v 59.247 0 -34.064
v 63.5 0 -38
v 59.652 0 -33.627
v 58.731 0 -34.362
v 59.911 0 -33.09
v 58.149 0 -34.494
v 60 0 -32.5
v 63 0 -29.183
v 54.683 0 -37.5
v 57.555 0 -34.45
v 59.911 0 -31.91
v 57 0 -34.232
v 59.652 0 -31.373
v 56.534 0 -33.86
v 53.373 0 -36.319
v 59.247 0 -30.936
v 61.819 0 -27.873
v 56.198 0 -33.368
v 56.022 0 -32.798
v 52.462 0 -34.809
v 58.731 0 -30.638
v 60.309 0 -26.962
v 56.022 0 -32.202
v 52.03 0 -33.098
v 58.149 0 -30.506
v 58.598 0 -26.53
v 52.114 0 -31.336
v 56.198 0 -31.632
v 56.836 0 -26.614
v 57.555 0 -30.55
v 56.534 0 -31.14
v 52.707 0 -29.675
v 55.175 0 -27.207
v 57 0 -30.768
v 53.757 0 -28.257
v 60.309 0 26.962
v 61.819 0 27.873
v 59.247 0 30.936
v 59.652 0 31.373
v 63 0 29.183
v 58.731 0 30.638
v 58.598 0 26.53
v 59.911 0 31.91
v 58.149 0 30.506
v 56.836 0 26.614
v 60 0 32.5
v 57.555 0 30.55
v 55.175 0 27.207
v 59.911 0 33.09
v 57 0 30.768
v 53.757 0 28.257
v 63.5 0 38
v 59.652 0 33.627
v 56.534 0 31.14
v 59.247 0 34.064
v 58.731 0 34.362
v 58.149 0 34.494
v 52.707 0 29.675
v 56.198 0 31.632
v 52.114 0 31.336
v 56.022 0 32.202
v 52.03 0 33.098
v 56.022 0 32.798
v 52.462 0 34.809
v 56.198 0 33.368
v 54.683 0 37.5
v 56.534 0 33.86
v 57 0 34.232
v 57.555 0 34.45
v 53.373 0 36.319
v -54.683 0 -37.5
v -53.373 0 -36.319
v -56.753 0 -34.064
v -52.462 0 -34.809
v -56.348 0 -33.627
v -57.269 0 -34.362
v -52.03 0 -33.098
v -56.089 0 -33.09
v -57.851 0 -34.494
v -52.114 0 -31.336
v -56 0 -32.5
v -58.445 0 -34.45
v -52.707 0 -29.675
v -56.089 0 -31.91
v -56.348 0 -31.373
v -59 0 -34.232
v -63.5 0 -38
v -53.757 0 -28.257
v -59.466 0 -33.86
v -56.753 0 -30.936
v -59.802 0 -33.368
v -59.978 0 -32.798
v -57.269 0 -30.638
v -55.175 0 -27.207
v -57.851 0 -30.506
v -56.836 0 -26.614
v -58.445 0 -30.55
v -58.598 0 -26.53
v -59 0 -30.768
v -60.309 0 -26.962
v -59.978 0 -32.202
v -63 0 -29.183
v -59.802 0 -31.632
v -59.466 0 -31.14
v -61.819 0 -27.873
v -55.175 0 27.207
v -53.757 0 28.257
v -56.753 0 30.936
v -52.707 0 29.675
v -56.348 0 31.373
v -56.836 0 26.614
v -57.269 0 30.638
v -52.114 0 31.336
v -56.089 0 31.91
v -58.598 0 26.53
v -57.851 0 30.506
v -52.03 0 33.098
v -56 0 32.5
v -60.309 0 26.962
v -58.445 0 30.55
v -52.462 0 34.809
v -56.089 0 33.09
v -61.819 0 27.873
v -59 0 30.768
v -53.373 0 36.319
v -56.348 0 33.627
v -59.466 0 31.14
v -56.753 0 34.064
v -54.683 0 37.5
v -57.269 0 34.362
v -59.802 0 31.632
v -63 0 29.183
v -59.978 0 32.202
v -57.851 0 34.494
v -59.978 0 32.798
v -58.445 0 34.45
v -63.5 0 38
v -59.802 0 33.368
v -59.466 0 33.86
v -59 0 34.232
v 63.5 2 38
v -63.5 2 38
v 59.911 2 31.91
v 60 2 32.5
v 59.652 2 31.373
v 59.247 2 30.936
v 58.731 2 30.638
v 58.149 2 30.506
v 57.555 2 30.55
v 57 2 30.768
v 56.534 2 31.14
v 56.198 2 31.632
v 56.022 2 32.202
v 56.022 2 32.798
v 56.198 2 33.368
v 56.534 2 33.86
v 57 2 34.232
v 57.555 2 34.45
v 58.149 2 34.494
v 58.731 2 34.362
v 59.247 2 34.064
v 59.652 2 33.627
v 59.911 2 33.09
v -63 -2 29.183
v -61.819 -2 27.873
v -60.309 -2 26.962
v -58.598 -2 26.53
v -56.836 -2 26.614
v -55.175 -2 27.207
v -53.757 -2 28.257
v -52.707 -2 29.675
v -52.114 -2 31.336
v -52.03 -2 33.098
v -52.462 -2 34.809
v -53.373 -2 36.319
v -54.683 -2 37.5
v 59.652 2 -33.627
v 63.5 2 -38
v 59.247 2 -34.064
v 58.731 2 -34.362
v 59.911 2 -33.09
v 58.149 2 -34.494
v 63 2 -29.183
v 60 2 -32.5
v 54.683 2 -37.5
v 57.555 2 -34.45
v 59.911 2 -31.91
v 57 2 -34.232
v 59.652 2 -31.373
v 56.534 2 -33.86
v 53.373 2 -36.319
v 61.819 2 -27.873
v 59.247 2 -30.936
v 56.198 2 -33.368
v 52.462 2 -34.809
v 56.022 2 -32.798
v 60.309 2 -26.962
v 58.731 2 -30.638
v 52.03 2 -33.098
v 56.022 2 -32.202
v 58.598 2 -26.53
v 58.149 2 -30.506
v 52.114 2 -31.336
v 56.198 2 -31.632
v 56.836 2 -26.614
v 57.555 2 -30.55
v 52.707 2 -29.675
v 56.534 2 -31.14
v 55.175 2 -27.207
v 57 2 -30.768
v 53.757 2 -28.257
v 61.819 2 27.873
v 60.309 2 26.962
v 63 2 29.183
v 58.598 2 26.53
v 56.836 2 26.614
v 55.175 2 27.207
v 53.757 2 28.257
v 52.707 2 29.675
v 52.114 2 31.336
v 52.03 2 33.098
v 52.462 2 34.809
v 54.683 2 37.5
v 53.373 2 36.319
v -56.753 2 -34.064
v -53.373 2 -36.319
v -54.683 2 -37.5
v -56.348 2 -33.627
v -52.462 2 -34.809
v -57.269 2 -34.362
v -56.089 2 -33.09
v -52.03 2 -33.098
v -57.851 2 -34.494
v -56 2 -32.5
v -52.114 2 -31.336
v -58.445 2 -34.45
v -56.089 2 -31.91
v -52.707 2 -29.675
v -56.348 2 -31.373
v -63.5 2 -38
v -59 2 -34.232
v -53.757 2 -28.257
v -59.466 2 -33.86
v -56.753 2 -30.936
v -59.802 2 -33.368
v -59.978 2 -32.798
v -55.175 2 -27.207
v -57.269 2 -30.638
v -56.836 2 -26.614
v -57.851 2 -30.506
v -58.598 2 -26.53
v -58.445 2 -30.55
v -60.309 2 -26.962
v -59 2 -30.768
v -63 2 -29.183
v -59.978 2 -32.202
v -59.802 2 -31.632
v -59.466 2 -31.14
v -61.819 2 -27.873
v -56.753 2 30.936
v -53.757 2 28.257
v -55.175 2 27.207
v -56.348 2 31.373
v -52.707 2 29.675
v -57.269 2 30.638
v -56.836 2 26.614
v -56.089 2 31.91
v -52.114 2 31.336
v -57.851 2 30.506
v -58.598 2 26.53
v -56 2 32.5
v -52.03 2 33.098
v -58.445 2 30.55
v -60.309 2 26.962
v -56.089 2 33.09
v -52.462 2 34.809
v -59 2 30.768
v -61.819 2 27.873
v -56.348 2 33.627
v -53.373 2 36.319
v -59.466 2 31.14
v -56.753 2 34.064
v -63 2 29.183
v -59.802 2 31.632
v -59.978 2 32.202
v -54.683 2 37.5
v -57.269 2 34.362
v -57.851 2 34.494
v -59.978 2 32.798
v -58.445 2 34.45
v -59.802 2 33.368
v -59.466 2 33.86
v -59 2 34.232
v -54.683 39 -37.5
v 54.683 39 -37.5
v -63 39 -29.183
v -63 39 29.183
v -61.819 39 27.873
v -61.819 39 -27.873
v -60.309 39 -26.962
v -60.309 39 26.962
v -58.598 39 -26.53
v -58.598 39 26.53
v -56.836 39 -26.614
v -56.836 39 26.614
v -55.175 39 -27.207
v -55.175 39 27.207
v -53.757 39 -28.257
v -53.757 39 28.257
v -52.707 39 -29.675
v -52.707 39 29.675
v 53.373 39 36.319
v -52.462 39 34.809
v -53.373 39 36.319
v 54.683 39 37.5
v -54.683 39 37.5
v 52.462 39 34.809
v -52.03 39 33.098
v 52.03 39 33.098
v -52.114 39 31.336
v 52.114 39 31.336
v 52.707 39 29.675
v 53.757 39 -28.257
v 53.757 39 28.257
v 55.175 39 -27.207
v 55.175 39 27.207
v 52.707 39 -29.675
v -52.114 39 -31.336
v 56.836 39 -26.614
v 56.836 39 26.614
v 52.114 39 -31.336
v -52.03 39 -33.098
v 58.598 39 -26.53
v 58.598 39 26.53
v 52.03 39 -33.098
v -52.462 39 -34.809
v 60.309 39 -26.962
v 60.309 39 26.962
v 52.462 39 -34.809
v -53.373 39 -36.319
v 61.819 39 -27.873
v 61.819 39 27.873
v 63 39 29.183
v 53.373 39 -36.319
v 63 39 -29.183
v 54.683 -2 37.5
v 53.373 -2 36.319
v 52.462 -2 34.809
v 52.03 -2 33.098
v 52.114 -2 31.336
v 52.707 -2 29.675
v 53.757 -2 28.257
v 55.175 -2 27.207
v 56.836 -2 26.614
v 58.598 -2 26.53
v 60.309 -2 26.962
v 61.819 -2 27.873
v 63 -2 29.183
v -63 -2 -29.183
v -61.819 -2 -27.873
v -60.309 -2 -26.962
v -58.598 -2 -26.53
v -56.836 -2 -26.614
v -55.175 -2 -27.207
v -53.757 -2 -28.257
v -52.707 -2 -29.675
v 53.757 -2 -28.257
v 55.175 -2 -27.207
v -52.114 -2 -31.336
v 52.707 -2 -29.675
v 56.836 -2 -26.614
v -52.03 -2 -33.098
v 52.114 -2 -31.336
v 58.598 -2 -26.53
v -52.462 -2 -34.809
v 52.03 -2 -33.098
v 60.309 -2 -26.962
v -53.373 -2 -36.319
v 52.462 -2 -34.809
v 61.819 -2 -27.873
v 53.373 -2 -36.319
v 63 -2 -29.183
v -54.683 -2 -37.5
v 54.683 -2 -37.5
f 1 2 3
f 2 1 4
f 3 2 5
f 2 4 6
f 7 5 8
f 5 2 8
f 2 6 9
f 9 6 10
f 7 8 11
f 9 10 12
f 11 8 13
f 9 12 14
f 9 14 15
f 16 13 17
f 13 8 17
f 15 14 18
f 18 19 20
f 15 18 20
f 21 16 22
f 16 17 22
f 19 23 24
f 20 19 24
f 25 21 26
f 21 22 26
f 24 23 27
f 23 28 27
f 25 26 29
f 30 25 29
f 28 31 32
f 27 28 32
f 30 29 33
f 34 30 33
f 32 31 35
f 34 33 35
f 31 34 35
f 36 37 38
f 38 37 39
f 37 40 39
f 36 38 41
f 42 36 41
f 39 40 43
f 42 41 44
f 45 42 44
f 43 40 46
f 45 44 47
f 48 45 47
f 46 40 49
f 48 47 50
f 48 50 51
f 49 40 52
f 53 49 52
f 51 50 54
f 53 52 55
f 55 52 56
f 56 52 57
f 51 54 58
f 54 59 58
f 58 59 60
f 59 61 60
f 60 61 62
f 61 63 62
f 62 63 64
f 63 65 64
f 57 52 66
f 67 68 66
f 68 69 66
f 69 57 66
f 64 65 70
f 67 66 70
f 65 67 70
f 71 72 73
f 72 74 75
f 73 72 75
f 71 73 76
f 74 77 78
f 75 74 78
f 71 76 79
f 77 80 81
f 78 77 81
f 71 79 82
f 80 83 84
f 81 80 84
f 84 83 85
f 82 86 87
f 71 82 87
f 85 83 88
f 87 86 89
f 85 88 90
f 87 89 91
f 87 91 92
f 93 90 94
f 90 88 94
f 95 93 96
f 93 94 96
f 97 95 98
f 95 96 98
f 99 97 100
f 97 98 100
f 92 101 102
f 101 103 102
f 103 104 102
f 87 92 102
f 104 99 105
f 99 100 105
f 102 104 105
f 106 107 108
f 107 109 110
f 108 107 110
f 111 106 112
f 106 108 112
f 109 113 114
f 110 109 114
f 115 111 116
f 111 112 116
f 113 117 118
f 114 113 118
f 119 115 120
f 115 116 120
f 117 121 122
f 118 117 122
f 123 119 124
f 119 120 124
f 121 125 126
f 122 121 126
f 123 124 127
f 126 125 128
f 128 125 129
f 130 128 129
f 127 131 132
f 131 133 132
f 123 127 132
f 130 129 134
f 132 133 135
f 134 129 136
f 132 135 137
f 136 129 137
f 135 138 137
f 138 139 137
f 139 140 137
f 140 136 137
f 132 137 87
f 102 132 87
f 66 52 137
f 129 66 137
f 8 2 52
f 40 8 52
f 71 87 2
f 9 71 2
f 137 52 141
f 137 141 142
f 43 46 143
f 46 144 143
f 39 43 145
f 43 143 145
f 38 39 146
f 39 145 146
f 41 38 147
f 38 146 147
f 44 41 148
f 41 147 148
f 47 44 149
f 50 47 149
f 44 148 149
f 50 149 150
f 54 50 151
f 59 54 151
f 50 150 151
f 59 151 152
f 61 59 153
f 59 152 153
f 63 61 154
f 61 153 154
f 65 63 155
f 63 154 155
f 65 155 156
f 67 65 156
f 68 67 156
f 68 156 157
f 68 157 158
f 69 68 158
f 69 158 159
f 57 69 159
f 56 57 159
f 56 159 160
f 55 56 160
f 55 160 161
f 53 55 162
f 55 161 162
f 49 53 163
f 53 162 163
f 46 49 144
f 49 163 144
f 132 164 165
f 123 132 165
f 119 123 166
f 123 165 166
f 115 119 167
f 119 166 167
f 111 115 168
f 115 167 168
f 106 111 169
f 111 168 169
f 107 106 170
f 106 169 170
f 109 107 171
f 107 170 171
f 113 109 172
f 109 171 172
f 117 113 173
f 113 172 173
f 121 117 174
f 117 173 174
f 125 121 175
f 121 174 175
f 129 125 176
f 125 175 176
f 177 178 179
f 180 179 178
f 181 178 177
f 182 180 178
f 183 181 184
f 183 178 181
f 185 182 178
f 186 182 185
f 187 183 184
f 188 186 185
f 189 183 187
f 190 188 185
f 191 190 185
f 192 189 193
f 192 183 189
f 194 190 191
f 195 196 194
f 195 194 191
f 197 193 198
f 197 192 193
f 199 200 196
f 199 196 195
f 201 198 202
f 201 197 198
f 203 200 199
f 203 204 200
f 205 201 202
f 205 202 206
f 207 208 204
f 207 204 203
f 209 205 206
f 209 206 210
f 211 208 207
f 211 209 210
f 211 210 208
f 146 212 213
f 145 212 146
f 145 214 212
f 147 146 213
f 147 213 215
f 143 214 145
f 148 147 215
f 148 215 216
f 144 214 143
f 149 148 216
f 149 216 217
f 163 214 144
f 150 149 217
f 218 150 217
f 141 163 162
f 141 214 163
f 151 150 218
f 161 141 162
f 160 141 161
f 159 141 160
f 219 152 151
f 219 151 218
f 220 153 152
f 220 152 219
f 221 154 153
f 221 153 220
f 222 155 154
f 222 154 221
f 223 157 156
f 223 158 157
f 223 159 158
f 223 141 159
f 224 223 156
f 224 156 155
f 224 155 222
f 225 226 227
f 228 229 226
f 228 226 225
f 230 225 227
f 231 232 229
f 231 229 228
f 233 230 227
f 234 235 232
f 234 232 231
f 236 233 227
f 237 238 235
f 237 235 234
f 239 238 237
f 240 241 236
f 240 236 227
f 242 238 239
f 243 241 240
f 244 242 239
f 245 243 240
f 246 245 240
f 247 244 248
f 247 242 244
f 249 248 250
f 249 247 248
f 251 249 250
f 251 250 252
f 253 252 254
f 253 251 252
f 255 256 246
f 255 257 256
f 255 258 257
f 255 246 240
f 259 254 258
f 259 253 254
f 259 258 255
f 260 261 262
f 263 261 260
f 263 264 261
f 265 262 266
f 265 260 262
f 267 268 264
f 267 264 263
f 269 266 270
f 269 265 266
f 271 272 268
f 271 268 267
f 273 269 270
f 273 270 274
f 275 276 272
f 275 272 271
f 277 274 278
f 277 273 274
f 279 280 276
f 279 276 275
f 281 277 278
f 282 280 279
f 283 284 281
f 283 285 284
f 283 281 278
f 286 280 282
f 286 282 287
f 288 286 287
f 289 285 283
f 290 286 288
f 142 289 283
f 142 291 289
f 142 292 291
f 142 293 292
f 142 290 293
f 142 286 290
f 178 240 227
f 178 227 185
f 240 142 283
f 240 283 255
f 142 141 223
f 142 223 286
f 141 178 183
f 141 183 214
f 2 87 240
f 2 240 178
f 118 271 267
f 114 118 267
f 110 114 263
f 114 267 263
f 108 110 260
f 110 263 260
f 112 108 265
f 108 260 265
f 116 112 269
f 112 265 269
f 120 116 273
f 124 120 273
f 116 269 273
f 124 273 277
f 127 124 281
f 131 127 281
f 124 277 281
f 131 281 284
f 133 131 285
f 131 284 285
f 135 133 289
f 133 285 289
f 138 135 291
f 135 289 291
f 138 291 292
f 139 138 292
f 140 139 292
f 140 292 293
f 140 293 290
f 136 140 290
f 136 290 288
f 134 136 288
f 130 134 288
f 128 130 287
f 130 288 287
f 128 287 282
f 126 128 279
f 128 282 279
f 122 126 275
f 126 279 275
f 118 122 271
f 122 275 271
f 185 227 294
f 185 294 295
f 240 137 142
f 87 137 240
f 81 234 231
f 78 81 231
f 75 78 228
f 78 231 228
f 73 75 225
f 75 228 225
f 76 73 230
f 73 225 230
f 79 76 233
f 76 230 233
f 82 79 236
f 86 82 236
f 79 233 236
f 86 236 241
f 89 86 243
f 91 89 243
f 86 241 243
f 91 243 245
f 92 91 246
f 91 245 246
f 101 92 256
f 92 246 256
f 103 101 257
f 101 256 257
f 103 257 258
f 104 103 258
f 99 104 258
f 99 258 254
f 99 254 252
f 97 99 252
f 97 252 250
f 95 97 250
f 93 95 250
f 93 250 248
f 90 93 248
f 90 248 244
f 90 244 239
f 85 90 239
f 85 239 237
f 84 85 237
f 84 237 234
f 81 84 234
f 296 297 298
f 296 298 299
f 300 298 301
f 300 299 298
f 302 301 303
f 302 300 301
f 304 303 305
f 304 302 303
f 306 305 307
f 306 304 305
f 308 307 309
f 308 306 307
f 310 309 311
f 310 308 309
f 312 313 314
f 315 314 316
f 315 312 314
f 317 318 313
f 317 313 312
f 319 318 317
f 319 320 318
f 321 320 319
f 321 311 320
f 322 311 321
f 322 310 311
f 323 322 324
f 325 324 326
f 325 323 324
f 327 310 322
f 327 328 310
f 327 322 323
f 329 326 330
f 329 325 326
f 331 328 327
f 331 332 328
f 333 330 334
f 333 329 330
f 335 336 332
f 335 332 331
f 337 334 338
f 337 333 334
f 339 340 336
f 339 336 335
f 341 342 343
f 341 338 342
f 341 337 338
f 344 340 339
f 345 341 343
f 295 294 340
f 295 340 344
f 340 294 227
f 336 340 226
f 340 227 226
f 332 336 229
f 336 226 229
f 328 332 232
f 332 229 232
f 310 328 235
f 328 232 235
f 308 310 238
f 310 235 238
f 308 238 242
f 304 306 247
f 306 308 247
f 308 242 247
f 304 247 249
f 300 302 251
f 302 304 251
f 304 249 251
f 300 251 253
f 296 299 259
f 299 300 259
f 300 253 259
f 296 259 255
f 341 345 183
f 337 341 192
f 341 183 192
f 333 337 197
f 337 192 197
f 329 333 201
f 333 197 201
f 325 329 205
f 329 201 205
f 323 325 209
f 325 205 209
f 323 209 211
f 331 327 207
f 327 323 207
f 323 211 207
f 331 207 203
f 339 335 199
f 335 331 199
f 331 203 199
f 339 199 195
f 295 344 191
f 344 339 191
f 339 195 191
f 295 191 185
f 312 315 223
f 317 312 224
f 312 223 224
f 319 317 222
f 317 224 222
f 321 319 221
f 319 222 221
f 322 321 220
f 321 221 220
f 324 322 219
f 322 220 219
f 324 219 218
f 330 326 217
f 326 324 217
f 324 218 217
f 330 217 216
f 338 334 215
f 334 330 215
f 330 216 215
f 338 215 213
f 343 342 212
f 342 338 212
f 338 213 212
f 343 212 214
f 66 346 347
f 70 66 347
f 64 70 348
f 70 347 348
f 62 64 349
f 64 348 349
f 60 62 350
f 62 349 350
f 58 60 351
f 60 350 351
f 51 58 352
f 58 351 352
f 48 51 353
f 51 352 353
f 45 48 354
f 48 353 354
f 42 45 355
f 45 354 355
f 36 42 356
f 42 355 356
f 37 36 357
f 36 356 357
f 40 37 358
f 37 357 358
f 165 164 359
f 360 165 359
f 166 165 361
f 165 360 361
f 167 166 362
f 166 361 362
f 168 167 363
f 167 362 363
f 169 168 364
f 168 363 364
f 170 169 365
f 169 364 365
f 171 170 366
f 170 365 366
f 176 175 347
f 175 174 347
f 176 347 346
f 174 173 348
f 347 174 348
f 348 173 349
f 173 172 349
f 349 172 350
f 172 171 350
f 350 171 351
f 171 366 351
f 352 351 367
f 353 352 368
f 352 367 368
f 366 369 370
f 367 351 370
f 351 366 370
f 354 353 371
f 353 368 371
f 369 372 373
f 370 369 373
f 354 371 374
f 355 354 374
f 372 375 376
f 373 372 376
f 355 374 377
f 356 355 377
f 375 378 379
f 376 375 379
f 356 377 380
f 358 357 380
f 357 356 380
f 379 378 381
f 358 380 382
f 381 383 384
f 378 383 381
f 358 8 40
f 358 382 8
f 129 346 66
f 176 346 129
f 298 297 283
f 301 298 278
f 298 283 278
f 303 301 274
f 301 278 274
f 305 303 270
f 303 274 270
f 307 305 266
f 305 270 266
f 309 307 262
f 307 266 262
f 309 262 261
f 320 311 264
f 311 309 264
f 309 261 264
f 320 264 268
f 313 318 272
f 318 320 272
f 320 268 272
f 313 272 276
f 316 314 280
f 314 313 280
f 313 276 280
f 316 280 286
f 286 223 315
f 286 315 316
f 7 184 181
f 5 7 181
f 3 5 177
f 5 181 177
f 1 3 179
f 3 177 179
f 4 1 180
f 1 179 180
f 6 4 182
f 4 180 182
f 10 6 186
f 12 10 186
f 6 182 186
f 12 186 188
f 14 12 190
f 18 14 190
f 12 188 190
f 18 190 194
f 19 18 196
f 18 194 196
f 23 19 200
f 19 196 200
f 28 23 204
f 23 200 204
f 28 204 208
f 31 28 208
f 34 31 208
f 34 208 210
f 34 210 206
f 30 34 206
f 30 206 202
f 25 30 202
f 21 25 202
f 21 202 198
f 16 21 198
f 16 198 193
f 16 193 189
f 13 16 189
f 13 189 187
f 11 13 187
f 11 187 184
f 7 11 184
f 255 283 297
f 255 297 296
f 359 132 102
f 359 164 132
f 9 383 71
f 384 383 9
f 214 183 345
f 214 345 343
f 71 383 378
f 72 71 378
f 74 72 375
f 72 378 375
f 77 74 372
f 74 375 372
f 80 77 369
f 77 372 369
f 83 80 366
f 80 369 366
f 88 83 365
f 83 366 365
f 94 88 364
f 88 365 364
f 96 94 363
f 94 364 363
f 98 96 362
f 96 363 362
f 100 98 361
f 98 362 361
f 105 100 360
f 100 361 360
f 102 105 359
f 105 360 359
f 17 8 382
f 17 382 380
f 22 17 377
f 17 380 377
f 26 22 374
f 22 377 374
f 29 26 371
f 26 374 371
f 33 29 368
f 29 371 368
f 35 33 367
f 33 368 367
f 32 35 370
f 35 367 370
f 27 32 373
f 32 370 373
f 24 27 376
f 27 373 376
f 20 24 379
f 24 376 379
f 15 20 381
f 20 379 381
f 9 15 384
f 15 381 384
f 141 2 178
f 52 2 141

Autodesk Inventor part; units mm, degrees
ref_plane "YZ Plane" through (0, 0, 0) normal (1, 0, 0) x (0, 1, 0)
ref_plane "XZ Plane" through (0, 0, 0) normal (0, 1, 0) x (-1, 0, 0)
ref_plane "XY Plane" through (0, 0, 0) normal (0, 0, 1) x (1, 0, 0)
sketch "Skizze1" plane through (0, 0, 0) normal (0, 1, 0) x (-1, 0, 0)
  line L0 (63.5, -38) -> (-63.5, -38)
  line L1 (-63.5, -38) -> (-63.5, 38)
  line L2 (-63.5, 38) -> (63.5, 38)
  line L3 (63.5, 38) -> (63.5, -38)
  point P0 (0, 0)
  point P1 (0, -38)
  point P2 (63.5, 0)
  dimension "d0" = 76
  dimension "d1" = 127
extrude "Extrusion1" add sketch "Skizze1" along normal blind 2
sketch "Skizze2" plane through (0, 2, 0) normal (0, 1, 0) x (1, 0, 0)
  circle A0 centre (-58, 32.5) radius 2
  circle A1 centre (-58, -32.5) radius 2
  circle A2 centre (58, -32.5) radius 2
  circle A3 centre (58, 32.5) radius 2
  point P0 (0, 0)
  dimension "d4" = 4
  dimension "d5" = 4
  dimension "d6" = 4
  dimension "d7" = 4
  dimension "d8" = 116
  dimension "d9" = 58
  dimension "d10" = 65
  dimension "d11" = 32.5
extrude "Extrusion2" cut sketch "Skizze2" against normal through all
sketch "Skizze4" plane through (0, 2, 0) normal (0, 1, 0) x (1, 0, 0)
  line L0 (-54.6834, 37.5) -> (54.6834, 37.5)
  line L1 (63, 29.1834) -> (63, -29.1834)
  line L2 (54.6834, -37.5) -> (-54.6834, -37.5)
  line L3 (-63, -29.1834) -> (-63, 29.1834)
  line L4 (63.5, -38) -> (63.5, 38) projected
  line L5 (63.5, 38) -> (-63.5, 38) projected
  line L6 (-63.5, -38) -> (63.5, -38) projected
  line L7 (-63.5, 38) -> (-63.5, -38) projected
  circle A0 centre (-58, 32.5) radius 2 projected
  circle A1 centre (-58, -32.5) radius 2 projected
  arc A2 (-54.6834, -37.5) -> (-63, -29.1834) centre (-58, -32.5) ccw
  circle A3 centre (58, -32.5) radius 2 projected
  arc A4 (63, -29.1834) -> (54.6834, -37.5) centre (58, -32.5) ccw
  arc A5 (54.6834, 37.5) -> (63, 29.1834) centre (58, 32.5) ccw
  circle A6 centre (58, 32.5) radius 2 projected
  arc A7 (-63, 29.1834) -> (-54.6834, 37.5) centre (-58, 32.5) ccw
  point P0 (0, 0)
  point P1 (60.3979, -38)
  point P2 (63.5, -34.8979)
  point P3 (-60.3979, -38)
  dimension "d14" = 0.5
  dimension "d15" = 0.5
  dimension "d16" = 0.5
  dimension "d17" = 0.5
  dimension "d19" = 6
  dimension "d21" = 6
  dimension "d22" = 6
  dimension "d27" = 6
extrude "Extrusion3" add sketch "Skizze4" along normal blind 37 and the other way blind 4 contours L0 A5 L1 A4 L2 A2 L3 A7
equation "\"d5\" = d4"
equation "\"d6\" = d4"
equation "\"d7\" = d4"
equation "\"d9\" = 0.5 * d8"
equation "\"d11\" = 0.5 * d10"
equation "\"d14\" = d15"
equation "\"d16\" = d15"
equation "\"d17\" = d15"
equation "\"d19\" = d20"
equation "\"d21\" = d20"
equation "\"d22\" = d27"
equation "\"d20\" = 6"
properties part number "netzteil_12V"
